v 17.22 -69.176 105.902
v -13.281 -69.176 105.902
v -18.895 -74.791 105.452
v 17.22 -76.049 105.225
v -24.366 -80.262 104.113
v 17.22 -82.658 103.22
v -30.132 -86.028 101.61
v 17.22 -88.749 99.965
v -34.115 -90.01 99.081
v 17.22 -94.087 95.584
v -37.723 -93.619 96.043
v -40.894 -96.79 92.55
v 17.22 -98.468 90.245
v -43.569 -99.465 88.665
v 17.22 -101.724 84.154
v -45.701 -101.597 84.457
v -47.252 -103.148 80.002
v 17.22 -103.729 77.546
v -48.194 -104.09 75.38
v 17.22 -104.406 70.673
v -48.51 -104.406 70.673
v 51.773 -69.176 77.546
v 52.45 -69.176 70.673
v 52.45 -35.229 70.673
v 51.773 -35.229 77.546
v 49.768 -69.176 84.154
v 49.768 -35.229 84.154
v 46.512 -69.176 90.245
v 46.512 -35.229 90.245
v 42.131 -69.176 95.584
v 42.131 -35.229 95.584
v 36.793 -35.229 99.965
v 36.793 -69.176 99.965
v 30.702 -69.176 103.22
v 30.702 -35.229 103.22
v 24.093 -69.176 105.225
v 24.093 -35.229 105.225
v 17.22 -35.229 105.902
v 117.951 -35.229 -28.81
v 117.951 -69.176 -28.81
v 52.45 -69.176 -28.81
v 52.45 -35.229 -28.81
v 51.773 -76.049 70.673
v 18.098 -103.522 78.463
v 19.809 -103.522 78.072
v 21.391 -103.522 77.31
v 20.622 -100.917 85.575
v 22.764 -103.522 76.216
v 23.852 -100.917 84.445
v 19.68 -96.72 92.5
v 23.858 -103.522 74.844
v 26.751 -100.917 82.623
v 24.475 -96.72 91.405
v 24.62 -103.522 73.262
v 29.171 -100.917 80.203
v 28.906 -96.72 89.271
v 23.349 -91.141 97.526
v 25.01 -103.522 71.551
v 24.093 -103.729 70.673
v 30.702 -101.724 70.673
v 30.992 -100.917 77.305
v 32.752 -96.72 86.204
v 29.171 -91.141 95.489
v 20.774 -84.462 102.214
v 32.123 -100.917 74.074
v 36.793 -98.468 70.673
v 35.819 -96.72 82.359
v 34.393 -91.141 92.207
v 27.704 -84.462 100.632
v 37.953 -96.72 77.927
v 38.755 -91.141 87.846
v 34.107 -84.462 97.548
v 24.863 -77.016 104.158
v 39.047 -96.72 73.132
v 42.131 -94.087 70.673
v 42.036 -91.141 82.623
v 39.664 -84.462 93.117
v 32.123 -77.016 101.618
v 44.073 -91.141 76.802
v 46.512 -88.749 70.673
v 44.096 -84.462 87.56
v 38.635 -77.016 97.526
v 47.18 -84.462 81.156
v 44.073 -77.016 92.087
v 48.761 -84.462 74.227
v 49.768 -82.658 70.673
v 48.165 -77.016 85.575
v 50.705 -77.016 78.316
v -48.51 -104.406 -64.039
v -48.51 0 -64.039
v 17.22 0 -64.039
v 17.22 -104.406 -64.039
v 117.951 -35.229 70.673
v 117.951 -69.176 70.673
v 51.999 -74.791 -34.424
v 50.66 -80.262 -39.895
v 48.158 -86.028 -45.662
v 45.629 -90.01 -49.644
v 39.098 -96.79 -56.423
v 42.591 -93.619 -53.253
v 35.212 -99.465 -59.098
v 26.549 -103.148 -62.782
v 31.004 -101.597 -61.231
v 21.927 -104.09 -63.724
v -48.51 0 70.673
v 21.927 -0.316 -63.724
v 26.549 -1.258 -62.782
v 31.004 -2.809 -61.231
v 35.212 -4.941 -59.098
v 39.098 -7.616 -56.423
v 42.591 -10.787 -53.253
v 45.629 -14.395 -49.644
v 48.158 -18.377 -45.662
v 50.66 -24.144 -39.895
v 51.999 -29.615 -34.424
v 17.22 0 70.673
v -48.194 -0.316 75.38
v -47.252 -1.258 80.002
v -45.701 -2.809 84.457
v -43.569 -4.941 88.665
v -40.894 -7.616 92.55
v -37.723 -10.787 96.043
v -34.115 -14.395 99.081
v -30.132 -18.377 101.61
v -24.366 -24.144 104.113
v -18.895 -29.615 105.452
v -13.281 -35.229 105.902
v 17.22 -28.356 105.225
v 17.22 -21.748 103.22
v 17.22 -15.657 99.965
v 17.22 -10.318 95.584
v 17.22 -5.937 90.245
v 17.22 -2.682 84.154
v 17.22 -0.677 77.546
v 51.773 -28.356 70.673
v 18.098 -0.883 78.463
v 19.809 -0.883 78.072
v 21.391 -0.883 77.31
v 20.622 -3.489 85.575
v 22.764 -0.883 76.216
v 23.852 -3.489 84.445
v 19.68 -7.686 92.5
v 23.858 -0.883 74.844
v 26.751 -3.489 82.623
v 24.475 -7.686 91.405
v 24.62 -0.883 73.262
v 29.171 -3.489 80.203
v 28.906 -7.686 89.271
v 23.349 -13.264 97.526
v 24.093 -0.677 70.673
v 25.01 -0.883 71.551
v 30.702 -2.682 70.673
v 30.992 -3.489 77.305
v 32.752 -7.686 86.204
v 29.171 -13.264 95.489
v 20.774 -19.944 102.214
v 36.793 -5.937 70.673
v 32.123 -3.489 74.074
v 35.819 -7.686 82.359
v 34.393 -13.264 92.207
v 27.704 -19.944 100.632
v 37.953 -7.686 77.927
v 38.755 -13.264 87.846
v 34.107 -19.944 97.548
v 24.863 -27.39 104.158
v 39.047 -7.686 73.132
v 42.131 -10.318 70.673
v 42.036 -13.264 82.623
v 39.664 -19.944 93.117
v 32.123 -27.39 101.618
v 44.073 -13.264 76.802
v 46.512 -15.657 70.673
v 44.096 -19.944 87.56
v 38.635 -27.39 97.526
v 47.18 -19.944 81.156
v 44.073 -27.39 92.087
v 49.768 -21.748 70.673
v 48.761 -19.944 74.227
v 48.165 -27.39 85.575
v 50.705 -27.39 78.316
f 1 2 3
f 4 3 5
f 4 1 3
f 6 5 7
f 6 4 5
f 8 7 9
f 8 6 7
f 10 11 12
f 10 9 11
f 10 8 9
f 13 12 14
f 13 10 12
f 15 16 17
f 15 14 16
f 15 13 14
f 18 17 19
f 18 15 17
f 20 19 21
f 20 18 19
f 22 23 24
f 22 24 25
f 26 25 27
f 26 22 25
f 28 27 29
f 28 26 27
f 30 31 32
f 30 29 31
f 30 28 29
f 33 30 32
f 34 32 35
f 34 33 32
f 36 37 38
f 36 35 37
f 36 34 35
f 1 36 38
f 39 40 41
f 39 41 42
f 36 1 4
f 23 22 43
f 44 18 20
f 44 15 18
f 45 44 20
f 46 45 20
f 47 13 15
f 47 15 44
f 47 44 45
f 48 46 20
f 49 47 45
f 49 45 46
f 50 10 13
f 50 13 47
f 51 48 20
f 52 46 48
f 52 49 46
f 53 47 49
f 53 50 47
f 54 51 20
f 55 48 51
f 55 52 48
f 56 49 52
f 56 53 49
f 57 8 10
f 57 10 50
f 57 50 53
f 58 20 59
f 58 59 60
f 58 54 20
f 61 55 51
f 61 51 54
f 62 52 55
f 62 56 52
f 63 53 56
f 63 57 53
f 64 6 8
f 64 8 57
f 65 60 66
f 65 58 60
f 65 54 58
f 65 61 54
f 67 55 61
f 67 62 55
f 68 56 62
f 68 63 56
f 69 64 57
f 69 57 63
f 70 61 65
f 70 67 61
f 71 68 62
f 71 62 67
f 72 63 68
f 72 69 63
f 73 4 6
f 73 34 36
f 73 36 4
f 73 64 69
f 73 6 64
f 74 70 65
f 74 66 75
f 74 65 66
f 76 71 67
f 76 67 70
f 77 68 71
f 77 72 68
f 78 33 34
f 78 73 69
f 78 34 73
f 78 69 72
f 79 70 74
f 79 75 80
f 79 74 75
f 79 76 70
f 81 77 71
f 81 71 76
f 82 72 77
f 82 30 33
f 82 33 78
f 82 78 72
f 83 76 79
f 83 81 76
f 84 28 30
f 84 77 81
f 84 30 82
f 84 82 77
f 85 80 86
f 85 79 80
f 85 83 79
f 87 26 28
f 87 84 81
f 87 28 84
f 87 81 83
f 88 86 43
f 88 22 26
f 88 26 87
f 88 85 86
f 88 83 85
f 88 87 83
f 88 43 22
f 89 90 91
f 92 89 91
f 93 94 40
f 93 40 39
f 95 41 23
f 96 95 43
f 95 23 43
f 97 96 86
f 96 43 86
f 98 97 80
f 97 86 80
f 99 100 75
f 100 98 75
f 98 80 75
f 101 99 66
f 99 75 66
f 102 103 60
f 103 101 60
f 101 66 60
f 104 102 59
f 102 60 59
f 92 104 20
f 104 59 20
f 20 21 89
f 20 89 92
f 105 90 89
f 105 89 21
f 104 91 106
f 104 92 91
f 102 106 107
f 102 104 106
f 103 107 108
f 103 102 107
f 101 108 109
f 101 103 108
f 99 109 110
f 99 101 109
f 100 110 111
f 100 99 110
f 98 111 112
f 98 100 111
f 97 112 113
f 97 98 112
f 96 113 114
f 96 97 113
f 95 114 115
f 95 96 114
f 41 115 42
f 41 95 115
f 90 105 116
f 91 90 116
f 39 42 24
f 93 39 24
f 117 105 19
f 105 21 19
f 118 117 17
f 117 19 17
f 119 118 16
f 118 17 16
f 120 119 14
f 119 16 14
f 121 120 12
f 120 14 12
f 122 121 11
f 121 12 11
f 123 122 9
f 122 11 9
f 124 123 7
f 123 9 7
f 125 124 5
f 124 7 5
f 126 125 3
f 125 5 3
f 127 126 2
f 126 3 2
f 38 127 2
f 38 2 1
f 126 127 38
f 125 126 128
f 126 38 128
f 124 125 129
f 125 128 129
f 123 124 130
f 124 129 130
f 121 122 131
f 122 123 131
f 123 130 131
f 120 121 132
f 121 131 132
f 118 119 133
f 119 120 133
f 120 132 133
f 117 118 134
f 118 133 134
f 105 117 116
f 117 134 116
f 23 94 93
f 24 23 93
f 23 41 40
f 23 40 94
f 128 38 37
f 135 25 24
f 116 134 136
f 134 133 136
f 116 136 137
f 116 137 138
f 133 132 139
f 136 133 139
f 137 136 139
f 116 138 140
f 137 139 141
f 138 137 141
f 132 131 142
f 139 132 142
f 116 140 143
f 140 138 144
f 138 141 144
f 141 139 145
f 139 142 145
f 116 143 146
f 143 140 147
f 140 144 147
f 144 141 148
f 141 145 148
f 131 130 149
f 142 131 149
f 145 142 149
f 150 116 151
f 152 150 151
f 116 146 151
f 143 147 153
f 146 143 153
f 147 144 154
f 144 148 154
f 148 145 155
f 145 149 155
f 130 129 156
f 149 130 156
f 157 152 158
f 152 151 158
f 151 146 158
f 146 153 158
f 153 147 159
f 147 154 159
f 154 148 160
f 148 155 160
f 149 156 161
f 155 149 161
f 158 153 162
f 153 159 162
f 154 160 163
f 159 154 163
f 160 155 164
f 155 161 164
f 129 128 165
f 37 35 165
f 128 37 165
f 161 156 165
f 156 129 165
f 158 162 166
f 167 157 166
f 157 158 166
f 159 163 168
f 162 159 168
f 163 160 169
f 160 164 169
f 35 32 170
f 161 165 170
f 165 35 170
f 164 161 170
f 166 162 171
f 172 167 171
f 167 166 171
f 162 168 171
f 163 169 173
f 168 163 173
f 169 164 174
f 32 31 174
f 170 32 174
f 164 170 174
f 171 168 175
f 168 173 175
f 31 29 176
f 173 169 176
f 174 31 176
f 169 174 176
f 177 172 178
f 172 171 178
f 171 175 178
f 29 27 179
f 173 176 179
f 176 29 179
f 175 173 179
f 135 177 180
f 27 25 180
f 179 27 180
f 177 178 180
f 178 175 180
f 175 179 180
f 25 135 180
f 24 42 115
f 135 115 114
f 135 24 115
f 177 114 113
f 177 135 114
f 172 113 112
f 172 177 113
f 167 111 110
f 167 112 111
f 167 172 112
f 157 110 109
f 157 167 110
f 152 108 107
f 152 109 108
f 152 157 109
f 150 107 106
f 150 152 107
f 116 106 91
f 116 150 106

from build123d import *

# Parameters (mm, degrees)
F1_W      = 100.959658
F1_H      = 169.9415
F2_DEPTH  = 104.405696
F3_R      = 35.229378
F2_FACE_W = 33.94694
F2_FACE_H = 99.482744
F4_DEPTH  = 65.501096


with BuildPart() as f2:
    # F1 (on face) → F2 (new body)
    with BuildSketch(Plane.XZ):
        with Locations((1.969874, 20.931415)):
            Rectangle(F1_W, F1_H)
    extrude(amount=F2_DEPTH)

    # F3
    f3_edges = [f2.edges().sort_by_distance(p)[0] for p in [
        (52.449703, -52.202848, 105.902165),
        (-48.509955, -52.202848, 105.902165),
        (1.969874, 0, 105.902165),
        (1.969874, -104.405696, 105.902165),
        (52.449703, -52.202848, -64.039335),
        (52.449703, 0, 20.931415),
        (52.449703, -104.405696, 20.931415),
    ]]
    fillet(f3_edges, radius=F3_R)

    # F2_face (on face) → F4 (join)
    with BuildSketch(Plane(origin=(52.449703, -52.202848, 20.931415), x_dir=(0, 1, 0), z_dir=(1, 0, 0))):
        Rectangle(F2_FACE_W, F2_FACE_H)
    extrude(amount=F4_DEPTH)


solid = f2.part
